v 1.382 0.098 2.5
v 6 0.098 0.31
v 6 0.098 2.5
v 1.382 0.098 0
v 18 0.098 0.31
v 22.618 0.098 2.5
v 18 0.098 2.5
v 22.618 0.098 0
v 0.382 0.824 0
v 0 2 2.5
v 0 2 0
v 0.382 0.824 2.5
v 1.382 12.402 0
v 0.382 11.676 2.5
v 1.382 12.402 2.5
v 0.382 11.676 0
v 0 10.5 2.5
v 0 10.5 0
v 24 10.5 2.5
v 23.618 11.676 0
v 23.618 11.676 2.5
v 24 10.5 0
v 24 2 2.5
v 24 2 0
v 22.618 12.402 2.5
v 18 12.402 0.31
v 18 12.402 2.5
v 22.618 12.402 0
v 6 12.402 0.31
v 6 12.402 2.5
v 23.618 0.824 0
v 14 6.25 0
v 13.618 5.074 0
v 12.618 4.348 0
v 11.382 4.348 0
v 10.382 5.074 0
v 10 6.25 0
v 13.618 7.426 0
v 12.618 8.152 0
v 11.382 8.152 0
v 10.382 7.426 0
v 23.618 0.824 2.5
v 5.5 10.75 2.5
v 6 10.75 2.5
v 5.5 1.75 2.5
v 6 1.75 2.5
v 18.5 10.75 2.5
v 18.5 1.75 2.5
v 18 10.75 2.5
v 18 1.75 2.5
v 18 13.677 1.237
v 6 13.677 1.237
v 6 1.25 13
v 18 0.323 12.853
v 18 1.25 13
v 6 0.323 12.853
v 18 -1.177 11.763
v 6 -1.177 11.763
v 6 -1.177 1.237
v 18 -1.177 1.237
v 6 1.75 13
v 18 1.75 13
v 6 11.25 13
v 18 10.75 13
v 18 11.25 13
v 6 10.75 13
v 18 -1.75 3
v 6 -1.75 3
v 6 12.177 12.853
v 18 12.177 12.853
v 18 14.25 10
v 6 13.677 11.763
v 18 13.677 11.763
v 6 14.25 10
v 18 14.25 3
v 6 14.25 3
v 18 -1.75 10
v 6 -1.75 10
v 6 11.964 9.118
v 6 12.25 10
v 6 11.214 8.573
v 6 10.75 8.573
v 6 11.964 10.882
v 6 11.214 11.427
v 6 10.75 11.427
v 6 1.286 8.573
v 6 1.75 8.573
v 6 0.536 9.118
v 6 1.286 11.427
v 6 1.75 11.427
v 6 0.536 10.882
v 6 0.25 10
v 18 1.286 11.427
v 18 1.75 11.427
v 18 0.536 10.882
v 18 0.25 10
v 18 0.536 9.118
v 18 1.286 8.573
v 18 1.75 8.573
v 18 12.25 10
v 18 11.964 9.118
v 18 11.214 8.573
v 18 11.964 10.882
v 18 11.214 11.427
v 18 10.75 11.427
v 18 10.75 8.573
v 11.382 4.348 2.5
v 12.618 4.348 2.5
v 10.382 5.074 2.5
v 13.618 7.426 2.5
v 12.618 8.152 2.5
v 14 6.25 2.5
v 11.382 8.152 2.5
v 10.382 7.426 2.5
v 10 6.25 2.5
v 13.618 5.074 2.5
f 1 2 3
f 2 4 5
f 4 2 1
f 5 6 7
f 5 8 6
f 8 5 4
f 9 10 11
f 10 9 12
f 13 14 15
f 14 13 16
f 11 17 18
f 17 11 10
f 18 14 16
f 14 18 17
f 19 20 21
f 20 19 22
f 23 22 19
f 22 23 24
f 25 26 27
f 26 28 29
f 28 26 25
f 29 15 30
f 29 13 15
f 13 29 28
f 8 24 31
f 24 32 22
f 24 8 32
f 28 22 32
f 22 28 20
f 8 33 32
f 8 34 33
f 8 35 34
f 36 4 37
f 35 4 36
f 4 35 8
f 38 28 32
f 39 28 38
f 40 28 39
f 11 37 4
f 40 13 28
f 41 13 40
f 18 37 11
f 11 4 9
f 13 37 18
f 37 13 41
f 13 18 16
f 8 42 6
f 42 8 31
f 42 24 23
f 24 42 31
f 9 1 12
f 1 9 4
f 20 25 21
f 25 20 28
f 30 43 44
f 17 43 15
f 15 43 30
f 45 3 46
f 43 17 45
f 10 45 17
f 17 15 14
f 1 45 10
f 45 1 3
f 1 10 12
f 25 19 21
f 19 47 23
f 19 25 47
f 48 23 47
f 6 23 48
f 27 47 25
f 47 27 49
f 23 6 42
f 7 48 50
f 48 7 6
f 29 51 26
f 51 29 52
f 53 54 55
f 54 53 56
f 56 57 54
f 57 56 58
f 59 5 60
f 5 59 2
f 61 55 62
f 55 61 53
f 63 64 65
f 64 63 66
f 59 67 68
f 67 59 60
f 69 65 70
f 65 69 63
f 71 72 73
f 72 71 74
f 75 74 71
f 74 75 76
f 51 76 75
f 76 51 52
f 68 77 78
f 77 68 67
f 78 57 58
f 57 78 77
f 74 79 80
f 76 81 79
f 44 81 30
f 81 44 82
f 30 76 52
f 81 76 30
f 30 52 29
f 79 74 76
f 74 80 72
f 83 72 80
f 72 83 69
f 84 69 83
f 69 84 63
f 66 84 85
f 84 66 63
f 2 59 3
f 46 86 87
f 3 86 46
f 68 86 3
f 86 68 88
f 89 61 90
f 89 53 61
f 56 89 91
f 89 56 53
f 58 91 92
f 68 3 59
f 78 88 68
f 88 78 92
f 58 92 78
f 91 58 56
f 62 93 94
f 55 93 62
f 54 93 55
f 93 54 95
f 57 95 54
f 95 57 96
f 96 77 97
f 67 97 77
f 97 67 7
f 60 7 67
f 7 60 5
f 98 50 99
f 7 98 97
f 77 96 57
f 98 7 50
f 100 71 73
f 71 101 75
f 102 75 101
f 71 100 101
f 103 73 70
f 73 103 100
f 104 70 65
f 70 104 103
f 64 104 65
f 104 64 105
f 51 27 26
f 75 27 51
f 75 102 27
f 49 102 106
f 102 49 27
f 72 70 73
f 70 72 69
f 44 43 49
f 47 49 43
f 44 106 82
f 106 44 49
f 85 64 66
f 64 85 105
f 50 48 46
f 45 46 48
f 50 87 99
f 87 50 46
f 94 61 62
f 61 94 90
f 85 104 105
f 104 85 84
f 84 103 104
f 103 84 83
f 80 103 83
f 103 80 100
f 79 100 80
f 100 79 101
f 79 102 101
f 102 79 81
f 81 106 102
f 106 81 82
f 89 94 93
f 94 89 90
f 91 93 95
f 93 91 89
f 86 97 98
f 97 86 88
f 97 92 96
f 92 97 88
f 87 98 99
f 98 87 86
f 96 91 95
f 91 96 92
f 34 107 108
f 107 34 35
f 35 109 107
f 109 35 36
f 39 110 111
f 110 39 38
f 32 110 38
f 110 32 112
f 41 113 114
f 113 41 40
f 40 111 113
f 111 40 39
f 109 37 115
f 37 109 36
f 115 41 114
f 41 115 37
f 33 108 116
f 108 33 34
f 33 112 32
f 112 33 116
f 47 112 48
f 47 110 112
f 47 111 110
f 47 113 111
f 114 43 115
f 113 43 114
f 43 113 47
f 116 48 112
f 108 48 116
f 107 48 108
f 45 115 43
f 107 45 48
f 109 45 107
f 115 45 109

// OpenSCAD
// CUSTOMIZER VARIABLES

// Precision of the model from 10 (low definition) to 180 (high definition)
PRECISION = 10; // [ 10:180 ]

// Rod thickness
ROD_Z = 3;

// Rod width
ROD_Y = 12;

// Radius of the screw hole
HOLE_R = 2;

// Height of the rod from the socle
HOOK_DZ = 10;

// Thickness of the socle
SOC_Z = 2.5;

//CUSTOMIZER VARIABLES END

$fn=PRECISION;

SOC_R = 1*2;
SOC_X = 2*ROD_Y;
SOC_Y = 1*12.5;

HOOK_R = ROD_Z/2+1.5;
HOOK_X = ROD_Y;
HOOK_Y = ROD_Y+2*HOLE_R;
HOOK_Z = 2*HOOK_R;

PASS_X  = HOOK_X+1;
PASS_Y  = ROD_Y-ROD_Z;
PASS_Z  = HOOK_DZ+HOOK_Z;
PASS_DZ = PASS_Z/2+SOC_Z;

module hook( h=HOOK_Z, w=HOOK_Y, l=HOOK_X ) {
    rotate ( [ 0, 0, 90 ] )
    union() {
        cube ( [w-h,l,h], center=true );
        translate( [ +(w/2-h/2), 0, 0 ] )
        rotate ( [ 90, 0, 0 ] )
        cylinder( r=h/2, h=l, center=true );
        translate( [ -(w/2-h/2), 0, 0 ] )
        rotate ( [ 90, 0, 0 ] )
        cylinder( r=h/2, h=l, center=true );
    }
}

difference() {

    union() {
        translate( [ SOC_R,SOC_R,0 ] )
        minkowski() {
            cube ( [SOC_X-2*SOC_R,SOC_Y-2*SOC_R,SOC_Z] );
            cylinder( r=SOC_R, h=0.0001 );
        }

        hull() {
            translate( [ SOC_X/2, SOC_Y/2, HOOK_DZ ] )
            hook();
            translate( [ SOC_X/2, SOC_Y/2, HOOK_Z/2 ] )
            hook();
        }
    }

    translate( [ SOC_X/2, SOC_Y/2, -0.01 ] )
    cylinder( r=HOLE_R, h=SOC_Z+0.1 );

    translate( [ SOC_X/2, SOC_Y/2, HOOK_DZ ] )
    hook( h=ROD_Z, w=ROD_Y, l=HOOK_X+4 );

    translate( [ SOC_X/2, SOC_Y/2, PASS_DZ ] )
    cube( [PASS_X,PASS_Y,PASS_Z], center=true );
}
